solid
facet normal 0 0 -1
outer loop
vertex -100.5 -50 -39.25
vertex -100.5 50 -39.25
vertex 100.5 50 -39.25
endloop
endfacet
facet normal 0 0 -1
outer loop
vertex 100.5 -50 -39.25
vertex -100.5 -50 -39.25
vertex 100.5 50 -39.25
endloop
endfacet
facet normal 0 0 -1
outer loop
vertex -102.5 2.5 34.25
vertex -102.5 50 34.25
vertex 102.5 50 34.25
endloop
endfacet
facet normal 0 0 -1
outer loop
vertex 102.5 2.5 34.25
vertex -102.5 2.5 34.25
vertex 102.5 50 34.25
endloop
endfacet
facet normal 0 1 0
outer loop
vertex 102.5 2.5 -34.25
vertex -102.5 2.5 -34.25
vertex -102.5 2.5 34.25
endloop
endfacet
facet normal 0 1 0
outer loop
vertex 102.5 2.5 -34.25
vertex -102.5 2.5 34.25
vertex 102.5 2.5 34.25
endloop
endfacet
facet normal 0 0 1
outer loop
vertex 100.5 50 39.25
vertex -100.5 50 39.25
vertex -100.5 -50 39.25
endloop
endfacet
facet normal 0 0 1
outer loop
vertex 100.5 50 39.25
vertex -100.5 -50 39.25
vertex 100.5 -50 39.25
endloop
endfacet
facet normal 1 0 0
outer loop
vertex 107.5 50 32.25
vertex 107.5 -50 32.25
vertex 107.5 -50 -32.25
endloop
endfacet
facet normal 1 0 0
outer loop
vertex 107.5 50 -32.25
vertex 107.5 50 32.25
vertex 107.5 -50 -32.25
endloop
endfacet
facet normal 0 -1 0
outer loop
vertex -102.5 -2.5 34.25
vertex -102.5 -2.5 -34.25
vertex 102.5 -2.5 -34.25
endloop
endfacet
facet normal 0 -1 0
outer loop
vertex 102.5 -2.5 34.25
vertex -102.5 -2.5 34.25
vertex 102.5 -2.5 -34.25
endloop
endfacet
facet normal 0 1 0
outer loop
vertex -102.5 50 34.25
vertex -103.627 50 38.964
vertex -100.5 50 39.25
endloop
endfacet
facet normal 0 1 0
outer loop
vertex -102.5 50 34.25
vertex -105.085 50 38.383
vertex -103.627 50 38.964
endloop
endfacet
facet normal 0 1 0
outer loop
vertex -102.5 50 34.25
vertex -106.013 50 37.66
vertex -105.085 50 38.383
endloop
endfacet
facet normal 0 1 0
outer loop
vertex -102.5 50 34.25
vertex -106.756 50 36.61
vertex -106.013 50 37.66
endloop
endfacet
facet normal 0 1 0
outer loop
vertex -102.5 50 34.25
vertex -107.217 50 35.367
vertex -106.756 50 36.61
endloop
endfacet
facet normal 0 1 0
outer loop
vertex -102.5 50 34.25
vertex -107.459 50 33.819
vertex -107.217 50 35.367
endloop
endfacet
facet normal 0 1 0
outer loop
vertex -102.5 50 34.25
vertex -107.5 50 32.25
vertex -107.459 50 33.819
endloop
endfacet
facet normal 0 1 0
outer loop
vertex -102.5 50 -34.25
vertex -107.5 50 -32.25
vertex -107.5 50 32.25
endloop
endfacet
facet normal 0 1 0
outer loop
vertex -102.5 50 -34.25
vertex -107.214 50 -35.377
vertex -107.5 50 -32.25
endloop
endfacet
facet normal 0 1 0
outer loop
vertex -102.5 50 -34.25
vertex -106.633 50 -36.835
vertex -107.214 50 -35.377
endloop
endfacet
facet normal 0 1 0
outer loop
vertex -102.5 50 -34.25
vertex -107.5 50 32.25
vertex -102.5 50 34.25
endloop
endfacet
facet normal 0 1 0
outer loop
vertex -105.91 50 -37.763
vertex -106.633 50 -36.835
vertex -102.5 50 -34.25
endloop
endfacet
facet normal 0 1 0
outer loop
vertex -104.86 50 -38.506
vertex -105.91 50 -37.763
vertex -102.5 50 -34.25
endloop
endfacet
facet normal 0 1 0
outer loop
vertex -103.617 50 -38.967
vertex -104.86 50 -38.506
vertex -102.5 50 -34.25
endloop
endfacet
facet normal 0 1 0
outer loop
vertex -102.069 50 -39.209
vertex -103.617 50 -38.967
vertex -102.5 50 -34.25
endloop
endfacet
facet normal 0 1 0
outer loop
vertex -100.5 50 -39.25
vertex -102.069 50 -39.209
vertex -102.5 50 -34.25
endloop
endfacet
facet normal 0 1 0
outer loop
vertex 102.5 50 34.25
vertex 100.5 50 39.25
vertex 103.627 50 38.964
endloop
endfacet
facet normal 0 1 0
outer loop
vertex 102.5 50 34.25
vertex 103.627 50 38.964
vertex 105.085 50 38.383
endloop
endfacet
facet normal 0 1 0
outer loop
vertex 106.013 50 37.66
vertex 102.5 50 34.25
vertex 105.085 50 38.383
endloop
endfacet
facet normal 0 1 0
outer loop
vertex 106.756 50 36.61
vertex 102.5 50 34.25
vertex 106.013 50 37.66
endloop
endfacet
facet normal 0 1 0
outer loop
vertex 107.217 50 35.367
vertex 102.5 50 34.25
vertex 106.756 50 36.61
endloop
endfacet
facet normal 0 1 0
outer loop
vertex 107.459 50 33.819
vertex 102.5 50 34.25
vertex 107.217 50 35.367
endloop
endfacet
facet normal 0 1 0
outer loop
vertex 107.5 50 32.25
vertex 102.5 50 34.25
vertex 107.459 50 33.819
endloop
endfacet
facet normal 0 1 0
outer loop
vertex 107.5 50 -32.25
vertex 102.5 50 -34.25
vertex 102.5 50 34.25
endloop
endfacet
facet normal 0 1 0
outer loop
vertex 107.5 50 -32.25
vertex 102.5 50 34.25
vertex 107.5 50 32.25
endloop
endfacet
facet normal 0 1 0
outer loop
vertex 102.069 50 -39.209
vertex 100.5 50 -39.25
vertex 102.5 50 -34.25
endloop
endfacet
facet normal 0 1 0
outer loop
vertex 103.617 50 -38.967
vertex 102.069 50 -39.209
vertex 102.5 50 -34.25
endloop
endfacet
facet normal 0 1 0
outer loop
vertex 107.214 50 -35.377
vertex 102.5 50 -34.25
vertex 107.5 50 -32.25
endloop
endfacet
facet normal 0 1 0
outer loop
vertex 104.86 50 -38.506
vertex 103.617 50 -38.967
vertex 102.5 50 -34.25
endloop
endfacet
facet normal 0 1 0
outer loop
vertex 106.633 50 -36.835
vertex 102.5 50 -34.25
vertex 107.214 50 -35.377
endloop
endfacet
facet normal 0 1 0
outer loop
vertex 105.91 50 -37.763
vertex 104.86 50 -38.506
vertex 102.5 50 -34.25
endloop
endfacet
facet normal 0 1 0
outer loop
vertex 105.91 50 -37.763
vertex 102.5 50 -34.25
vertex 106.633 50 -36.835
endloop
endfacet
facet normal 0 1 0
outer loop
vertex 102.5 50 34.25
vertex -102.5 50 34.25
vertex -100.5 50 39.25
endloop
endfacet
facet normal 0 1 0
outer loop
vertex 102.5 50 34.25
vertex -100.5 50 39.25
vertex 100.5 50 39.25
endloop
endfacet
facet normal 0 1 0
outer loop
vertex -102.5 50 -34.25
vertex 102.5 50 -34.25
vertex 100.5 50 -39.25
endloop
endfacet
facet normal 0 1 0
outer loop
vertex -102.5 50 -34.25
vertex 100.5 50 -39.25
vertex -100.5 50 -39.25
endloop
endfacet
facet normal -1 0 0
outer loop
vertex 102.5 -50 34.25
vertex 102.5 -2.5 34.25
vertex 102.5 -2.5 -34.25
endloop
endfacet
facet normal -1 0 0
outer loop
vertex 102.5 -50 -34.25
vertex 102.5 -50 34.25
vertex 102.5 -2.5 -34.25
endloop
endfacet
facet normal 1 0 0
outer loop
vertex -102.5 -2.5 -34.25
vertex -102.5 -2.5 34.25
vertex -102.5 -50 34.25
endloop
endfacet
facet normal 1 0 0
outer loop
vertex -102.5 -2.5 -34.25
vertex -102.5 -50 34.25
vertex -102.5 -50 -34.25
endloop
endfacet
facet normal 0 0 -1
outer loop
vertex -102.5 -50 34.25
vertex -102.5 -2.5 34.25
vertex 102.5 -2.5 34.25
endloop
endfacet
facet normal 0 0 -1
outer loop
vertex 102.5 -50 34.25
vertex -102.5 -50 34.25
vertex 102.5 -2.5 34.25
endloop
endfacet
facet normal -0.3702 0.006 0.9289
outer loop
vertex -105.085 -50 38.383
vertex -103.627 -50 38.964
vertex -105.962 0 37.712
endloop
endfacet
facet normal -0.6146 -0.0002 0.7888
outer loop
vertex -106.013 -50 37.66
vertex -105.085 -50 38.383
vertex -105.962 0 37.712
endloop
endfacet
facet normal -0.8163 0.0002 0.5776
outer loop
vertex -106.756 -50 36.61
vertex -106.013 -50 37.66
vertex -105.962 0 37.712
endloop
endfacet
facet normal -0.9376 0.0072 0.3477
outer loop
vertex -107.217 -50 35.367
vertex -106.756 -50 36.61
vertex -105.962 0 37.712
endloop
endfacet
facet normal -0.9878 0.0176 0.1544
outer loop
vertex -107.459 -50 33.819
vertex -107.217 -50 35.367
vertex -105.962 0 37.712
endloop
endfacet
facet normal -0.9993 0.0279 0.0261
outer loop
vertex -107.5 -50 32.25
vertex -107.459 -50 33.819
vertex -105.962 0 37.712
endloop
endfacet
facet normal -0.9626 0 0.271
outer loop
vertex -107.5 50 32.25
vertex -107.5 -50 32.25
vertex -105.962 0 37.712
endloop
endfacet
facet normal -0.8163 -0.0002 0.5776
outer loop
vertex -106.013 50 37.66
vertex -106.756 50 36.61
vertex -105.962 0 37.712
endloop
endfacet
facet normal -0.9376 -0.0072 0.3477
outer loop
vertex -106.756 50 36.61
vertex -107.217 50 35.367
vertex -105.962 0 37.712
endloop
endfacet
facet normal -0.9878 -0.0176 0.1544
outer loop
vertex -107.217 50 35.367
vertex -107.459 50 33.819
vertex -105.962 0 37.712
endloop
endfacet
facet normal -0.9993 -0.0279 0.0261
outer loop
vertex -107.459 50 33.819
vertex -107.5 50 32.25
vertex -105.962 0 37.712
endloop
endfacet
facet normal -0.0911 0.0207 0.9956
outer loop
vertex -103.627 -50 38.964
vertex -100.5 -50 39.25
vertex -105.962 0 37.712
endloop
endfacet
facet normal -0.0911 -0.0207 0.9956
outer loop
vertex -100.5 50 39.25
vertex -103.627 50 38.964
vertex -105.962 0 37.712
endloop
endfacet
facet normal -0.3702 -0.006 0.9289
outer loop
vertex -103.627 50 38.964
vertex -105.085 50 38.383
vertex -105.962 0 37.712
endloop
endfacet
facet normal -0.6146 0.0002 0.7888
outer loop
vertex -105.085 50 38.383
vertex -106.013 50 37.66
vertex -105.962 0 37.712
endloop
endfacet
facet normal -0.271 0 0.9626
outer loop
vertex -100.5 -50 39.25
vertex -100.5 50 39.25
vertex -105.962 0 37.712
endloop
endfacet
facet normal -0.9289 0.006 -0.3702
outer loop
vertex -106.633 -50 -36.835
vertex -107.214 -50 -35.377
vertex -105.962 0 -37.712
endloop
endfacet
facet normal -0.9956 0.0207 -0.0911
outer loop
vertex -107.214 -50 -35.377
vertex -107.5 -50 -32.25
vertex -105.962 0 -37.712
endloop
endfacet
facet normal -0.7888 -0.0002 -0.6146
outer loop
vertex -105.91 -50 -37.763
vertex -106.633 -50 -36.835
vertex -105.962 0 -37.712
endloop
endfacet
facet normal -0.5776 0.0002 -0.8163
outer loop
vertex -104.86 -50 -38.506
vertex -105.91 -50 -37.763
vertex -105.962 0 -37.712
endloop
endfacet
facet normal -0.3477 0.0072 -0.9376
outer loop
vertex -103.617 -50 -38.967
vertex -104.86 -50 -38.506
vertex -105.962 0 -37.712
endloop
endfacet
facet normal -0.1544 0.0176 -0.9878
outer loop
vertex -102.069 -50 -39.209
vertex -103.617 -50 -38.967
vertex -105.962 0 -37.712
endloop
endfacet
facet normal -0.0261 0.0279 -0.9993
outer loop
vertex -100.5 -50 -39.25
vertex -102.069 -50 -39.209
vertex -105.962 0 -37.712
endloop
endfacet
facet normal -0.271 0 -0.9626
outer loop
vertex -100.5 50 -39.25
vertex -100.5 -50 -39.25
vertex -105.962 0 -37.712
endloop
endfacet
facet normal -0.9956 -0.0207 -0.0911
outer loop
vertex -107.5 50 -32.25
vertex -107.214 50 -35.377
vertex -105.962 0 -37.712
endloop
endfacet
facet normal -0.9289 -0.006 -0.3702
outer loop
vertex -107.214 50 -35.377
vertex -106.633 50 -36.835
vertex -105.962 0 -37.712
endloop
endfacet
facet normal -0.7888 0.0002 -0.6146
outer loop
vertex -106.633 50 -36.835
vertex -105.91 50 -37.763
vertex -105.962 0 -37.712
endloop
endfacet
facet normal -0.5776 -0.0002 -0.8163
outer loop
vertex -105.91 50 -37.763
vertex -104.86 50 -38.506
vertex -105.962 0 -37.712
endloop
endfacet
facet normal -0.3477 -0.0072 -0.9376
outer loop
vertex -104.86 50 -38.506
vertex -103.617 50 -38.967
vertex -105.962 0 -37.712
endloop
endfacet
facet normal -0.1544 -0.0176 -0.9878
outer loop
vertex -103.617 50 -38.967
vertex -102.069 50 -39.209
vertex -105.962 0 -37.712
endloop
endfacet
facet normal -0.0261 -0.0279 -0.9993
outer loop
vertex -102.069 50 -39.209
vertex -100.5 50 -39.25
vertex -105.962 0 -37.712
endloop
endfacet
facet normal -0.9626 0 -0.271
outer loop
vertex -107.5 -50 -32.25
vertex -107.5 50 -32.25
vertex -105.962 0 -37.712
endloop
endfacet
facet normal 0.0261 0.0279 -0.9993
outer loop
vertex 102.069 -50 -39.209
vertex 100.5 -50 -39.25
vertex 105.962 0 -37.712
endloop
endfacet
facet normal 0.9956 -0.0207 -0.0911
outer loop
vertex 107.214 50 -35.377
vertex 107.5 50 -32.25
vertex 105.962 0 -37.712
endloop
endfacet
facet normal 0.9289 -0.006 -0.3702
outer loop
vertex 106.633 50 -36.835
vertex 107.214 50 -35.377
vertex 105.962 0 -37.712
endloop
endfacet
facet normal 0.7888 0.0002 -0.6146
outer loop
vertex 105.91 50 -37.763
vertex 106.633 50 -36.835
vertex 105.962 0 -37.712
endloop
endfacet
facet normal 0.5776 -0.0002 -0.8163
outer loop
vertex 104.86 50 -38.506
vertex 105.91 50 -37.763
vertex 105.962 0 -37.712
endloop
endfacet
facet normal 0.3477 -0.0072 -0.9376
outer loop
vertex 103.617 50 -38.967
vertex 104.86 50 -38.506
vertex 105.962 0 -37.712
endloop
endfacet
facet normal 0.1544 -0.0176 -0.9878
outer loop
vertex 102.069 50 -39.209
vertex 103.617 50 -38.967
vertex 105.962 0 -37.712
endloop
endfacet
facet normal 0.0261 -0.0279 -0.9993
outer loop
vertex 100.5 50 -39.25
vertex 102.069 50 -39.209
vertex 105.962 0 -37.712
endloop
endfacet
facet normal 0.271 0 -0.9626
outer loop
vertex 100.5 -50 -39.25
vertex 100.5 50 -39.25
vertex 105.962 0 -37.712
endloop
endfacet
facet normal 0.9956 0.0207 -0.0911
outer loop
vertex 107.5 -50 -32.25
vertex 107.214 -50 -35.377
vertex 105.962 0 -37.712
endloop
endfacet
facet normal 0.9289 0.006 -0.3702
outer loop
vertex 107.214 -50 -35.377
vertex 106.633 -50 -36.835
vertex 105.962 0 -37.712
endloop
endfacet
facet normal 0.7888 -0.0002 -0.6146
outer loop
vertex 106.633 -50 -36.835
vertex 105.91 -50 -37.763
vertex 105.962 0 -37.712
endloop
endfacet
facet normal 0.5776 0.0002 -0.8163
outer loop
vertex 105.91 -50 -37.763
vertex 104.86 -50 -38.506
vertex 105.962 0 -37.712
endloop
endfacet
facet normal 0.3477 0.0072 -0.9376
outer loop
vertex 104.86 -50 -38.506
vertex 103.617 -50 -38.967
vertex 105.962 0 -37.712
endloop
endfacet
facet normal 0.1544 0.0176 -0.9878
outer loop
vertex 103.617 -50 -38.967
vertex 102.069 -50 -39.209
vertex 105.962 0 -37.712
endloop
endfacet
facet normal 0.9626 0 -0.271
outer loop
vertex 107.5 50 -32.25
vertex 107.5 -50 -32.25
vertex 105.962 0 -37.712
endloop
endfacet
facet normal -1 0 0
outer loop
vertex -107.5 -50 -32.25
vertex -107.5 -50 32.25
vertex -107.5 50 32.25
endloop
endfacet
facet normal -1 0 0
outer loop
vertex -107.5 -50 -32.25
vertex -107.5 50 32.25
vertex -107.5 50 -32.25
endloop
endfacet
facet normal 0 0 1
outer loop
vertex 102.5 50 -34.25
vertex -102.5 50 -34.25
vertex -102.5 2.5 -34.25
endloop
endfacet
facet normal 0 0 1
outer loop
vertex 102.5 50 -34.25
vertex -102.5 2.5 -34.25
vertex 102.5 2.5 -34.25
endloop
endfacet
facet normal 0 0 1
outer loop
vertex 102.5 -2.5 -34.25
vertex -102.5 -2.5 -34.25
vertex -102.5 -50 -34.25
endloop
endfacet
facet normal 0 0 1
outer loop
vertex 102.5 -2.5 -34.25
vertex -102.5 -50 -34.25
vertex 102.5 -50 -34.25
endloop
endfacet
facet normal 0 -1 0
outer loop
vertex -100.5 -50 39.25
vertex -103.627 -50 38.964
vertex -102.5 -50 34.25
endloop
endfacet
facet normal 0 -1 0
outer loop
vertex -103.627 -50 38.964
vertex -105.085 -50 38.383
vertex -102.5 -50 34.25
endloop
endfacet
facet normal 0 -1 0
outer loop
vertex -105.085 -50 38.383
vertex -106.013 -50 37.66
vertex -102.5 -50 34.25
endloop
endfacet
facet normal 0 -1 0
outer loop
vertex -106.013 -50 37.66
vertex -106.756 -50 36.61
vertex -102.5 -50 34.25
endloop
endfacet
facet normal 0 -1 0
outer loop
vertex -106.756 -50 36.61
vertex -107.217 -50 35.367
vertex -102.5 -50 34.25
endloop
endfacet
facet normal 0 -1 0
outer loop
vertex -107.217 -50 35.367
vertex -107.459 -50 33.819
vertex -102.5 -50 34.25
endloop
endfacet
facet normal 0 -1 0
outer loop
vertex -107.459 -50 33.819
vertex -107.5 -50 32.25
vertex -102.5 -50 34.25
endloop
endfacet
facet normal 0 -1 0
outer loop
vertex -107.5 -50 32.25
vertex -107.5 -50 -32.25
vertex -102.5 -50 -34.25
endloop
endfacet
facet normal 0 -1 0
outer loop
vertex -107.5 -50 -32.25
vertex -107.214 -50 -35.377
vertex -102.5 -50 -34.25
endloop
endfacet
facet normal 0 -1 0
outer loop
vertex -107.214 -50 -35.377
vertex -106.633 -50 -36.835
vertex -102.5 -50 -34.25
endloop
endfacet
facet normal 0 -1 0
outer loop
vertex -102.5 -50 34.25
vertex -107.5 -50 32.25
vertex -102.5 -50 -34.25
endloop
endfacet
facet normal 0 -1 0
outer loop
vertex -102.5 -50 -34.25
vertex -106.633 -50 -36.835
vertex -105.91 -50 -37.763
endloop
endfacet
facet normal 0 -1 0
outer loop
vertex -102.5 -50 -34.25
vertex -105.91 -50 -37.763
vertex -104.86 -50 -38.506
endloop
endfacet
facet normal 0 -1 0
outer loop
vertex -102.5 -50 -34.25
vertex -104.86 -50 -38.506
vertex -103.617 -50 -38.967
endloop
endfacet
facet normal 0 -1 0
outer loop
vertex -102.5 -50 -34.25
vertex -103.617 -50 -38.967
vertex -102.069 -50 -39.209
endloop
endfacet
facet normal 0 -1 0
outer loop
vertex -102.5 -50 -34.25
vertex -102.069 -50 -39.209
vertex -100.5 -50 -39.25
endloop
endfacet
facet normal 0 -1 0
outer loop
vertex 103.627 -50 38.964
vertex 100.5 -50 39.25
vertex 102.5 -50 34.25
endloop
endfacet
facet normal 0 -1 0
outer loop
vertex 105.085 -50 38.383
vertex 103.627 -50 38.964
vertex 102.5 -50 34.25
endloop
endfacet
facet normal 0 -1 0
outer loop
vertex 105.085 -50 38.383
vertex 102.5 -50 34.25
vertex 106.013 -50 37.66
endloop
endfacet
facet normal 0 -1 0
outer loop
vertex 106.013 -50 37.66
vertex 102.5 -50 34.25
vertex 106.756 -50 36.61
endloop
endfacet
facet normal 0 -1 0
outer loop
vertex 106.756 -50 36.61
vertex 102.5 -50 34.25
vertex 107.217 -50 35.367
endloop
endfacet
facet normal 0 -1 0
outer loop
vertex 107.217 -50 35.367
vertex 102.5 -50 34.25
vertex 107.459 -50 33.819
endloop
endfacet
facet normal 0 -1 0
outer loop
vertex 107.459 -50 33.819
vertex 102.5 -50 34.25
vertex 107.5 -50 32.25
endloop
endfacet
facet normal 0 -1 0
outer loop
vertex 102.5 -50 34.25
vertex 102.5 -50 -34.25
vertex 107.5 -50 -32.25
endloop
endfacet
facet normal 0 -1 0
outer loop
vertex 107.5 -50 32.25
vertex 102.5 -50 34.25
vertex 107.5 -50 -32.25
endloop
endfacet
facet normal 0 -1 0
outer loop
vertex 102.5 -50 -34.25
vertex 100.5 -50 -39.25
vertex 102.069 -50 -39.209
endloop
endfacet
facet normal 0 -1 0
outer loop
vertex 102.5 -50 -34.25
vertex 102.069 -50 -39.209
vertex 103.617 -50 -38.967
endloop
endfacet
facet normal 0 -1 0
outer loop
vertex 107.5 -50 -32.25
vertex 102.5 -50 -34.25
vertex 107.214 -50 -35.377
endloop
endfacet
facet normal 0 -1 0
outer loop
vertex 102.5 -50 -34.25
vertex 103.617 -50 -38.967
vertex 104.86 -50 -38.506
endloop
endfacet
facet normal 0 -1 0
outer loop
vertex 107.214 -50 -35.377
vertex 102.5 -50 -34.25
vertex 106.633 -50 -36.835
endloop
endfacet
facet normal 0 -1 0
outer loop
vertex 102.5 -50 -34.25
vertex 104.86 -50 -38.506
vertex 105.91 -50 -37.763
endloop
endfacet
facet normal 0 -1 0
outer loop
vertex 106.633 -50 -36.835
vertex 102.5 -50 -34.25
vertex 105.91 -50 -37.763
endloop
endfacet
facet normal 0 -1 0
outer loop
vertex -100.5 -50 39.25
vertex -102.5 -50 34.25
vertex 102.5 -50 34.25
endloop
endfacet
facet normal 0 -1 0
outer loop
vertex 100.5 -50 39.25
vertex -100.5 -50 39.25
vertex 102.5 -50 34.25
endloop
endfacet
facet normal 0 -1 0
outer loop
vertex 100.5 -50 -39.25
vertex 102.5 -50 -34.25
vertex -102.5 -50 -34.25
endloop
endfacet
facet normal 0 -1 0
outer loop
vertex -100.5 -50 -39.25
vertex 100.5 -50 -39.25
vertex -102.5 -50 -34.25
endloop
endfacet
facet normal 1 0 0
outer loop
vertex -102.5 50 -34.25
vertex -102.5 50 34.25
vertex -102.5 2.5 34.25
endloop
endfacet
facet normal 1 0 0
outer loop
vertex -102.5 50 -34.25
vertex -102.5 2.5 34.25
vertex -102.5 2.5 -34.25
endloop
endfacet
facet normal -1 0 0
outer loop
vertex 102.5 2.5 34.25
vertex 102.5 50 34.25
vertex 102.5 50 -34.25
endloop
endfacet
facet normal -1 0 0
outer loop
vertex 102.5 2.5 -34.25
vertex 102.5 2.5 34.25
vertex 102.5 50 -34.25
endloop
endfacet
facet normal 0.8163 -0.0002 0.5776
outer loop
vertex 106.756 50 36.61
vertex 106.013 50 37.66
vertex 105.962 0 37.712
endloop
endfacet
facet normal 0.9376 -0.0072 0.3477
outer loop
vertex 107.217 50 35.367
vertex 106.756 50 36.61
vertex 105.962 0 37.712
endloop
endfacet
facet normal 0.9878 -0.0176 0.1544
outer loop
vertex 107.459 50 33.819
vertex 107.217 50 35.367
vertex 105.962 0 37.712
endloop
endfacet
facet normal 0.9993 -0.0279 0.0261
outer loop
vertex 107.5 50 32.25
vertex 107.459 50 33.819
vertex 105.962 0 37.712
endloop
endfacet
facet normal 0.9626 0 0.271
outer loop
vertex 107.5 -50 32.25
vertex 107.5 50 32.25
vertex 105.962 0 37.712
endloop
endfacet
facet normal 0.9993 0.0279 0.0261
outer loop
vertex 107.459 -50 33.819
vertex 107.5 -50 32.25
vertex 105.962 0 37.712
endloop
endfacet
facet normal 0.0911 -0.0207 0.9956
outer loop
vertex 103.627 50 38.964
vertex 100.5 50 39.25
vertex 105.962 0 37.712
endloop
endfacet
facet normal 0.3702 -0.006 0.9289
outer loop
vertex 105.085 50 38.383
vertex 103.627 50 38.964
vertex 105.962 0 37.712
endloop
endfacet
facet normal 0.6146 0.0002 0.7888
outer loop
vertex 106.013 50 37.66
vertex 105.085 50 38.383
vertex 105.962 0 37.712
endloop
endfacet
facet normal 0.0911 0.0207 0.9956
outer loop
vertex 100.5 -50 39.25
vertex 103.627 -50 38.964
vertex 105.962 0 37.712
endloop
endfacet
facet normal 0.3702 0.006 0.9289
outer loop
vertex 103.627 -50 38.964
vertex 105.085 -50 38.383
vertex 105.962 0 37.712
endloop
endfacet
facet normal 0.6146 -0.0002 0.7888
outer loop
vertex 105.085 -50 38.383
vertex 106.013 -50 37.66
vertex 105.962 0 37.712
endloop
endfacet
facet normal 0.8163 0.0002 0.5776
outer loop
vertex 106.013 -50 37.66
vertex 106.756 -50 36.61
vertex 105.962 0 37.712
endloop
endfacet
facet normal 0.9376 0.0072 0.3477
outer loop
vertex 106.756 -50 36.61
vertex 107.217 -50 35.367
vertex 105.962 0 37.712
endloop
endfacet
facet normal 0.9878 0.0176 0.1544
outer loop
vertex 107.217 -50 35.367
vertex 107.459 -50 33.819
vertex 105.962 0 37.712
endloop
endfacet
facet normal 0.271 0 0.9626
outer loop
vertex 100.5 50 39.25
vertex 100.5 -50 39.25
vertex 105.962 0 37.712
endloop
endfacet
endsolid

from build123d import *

# Parameters (mm, degrees)
SKETCH2_W           = 215
SKETCH2_H           = 78.5
SKETCH2_W_2         = 205
SKETCH2_H_2         = 68.5
BOSS_EXTRUDE1_DEPTH = 50
SKETCH2_2_W         = 205
SKETCH2_2_H         = 68.5
BOSS_EXTRUDE2_DEPTH = 2.5
FILLET1_SIZE        = 7


with BuildPart() as part:
    # Sketch2 → Boss-Extrude1 (new, symmetric)
    with BuildSketch(Plane(origin=(0, 0, 0), x_dir=(1, 0, 0), z_dir=(0, 1, 0))):
        Rectangle(SKETCH2_W, SKETCH2_H)
        Rectangle(SKETCH2_W_2, SKETCH2_H_2, mode=Mode.SUBTRACT)
    extrude(amount=BOSS_EXTRUDE1_DEPTH, both=True)

    # Sketch2<2> → Boss-Extrude2 (add, symmetric)
    with BuildSketch(Plane(origin=(0, 0, 0), x_dir=(1, 0, 0), z_dir=(0, 1, 0))):
        Rectangle(SKETCH2_2_W, SKETCH2_2_H)
    extrude(amount=BOSS_EXTRUDE2_DEPTH, both=True)

    # Fillet1
    # a fillet whose section is not a circle: 7 mm, written as the material it takes off along each edge
    with BuildSketch(Plane(origin=(-107.5, -67.5, -39.25), x_dir=(1, 0, 0), z_dir=(0, 1, 0)), Plane(origin=(-107.5, -67.5, 39.25), x_dir=(0, 0, -1), z_dir=(0, 1, 0)), Plane(origin=(107.5, 67.5, 39.25), x_dir=(0, 0, -1), z_dir=(0, -1, 0)), Plane(origin=(107.5, 67.5, -39.25), x_dir=(-1, 0, 0), z_dir=(0, -1, 0))) as fillet1_piece_1:
        with BuildLine():
            add(Edge.make_bspline([(FILLET1_SIZE, 0), (FILLET1_SIZE * 0.831801948466, 0), (FILLET1_SIZE * 0.663603896932, 0), (FILLET1_SIZE * 0.292893218813, -FILLET1_SIZE * 0.0716919198361), (FILLET1_SIZE * 0.0716919198361, -FILLET1_SIZE * 0.292893218813), (0, -FILLET1_SIZE * 0.663603896932), (0, -FILLET1_SIZE * 0.831801948466), (0, -FILLET1_SIZE)], knots=[0, 0, 0, 0, 0, 0, 0.5, 0.5, 1, 1, 1, 1, 1, 1], degree=5))
            Line((0, -FILLET1_SIZE), (0, 0))
            Line((0, 0), (FILLET1_SIZE, 0))
        make_face()
    extrude(amount=135, mode=Mode.SUBTRACT)


solid = part.part
